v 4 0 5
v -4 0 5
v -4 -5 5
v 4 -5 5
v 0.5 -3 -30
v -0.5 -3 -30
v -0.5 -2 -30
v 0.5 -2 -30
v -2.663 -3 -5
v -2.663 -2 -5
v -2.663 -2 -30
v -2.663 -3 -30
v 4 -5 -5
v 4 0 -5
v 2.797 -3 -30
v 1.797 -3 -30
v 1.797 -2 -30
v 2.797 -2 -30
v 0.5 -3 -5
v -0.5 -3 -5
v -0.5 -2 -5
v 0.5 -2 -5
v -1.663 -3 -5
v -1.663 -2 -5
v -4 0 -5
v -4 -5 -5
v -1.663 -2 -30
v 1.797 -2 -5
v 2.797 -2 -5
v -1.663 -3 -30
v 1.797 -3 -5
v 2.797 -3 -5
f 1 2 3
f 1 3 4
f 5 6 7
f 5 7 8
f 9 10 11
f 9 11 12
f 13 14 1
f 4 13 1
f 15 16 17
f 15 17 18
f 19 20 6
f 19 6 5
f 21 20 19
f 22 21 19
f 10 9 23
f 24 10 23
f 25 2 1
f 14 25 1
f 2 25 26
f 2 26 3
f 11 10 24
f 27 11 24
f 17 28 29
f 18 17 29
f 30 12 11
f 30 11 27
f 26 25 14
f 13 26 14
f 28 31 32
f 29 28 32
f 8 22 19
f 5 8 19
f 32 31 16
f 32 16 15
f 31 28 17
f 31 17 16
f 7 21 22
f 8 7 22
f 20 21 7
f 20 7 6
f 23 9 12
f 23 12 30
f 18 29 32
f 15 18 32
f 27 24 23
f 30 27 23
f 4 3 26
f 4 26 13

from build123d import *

# Parameters (mm, degrees)
F0_W     = 8
F0_H     = 10
F1_DEPTH = 5
F2_W     = 1
F2_H     = 1
F3_DEPTH = 25


with BuildPart() as f1:
    # F0 (on Front) → F1 (new body)
    with BuildSketch(Plane.XZ):
        Rectangle(F0_W, F0_H)
    extrude(amount=F1_DEPTH)


with BuildPart() as f3:
    # F2 (on face) → F3 (new body)
    with BuildSketch(Plane(origin=(0, 0, -5), x_dir=(1, 0, 0), z_dir=(0, 0, -1))):
        with Locations((0, 2.5)):
            Rectangle(F2_W, F2_H)
        with Locations((2.297318, 2.5)):
            Rectangle(F2_W, F2_H)
        with Locations((-2.162663, 2.5)):
            Rectangle(F2_W, F2_H)
    extrude(amount=F3_DEPTH)


solid = Compound([f1.part, f3.part])
